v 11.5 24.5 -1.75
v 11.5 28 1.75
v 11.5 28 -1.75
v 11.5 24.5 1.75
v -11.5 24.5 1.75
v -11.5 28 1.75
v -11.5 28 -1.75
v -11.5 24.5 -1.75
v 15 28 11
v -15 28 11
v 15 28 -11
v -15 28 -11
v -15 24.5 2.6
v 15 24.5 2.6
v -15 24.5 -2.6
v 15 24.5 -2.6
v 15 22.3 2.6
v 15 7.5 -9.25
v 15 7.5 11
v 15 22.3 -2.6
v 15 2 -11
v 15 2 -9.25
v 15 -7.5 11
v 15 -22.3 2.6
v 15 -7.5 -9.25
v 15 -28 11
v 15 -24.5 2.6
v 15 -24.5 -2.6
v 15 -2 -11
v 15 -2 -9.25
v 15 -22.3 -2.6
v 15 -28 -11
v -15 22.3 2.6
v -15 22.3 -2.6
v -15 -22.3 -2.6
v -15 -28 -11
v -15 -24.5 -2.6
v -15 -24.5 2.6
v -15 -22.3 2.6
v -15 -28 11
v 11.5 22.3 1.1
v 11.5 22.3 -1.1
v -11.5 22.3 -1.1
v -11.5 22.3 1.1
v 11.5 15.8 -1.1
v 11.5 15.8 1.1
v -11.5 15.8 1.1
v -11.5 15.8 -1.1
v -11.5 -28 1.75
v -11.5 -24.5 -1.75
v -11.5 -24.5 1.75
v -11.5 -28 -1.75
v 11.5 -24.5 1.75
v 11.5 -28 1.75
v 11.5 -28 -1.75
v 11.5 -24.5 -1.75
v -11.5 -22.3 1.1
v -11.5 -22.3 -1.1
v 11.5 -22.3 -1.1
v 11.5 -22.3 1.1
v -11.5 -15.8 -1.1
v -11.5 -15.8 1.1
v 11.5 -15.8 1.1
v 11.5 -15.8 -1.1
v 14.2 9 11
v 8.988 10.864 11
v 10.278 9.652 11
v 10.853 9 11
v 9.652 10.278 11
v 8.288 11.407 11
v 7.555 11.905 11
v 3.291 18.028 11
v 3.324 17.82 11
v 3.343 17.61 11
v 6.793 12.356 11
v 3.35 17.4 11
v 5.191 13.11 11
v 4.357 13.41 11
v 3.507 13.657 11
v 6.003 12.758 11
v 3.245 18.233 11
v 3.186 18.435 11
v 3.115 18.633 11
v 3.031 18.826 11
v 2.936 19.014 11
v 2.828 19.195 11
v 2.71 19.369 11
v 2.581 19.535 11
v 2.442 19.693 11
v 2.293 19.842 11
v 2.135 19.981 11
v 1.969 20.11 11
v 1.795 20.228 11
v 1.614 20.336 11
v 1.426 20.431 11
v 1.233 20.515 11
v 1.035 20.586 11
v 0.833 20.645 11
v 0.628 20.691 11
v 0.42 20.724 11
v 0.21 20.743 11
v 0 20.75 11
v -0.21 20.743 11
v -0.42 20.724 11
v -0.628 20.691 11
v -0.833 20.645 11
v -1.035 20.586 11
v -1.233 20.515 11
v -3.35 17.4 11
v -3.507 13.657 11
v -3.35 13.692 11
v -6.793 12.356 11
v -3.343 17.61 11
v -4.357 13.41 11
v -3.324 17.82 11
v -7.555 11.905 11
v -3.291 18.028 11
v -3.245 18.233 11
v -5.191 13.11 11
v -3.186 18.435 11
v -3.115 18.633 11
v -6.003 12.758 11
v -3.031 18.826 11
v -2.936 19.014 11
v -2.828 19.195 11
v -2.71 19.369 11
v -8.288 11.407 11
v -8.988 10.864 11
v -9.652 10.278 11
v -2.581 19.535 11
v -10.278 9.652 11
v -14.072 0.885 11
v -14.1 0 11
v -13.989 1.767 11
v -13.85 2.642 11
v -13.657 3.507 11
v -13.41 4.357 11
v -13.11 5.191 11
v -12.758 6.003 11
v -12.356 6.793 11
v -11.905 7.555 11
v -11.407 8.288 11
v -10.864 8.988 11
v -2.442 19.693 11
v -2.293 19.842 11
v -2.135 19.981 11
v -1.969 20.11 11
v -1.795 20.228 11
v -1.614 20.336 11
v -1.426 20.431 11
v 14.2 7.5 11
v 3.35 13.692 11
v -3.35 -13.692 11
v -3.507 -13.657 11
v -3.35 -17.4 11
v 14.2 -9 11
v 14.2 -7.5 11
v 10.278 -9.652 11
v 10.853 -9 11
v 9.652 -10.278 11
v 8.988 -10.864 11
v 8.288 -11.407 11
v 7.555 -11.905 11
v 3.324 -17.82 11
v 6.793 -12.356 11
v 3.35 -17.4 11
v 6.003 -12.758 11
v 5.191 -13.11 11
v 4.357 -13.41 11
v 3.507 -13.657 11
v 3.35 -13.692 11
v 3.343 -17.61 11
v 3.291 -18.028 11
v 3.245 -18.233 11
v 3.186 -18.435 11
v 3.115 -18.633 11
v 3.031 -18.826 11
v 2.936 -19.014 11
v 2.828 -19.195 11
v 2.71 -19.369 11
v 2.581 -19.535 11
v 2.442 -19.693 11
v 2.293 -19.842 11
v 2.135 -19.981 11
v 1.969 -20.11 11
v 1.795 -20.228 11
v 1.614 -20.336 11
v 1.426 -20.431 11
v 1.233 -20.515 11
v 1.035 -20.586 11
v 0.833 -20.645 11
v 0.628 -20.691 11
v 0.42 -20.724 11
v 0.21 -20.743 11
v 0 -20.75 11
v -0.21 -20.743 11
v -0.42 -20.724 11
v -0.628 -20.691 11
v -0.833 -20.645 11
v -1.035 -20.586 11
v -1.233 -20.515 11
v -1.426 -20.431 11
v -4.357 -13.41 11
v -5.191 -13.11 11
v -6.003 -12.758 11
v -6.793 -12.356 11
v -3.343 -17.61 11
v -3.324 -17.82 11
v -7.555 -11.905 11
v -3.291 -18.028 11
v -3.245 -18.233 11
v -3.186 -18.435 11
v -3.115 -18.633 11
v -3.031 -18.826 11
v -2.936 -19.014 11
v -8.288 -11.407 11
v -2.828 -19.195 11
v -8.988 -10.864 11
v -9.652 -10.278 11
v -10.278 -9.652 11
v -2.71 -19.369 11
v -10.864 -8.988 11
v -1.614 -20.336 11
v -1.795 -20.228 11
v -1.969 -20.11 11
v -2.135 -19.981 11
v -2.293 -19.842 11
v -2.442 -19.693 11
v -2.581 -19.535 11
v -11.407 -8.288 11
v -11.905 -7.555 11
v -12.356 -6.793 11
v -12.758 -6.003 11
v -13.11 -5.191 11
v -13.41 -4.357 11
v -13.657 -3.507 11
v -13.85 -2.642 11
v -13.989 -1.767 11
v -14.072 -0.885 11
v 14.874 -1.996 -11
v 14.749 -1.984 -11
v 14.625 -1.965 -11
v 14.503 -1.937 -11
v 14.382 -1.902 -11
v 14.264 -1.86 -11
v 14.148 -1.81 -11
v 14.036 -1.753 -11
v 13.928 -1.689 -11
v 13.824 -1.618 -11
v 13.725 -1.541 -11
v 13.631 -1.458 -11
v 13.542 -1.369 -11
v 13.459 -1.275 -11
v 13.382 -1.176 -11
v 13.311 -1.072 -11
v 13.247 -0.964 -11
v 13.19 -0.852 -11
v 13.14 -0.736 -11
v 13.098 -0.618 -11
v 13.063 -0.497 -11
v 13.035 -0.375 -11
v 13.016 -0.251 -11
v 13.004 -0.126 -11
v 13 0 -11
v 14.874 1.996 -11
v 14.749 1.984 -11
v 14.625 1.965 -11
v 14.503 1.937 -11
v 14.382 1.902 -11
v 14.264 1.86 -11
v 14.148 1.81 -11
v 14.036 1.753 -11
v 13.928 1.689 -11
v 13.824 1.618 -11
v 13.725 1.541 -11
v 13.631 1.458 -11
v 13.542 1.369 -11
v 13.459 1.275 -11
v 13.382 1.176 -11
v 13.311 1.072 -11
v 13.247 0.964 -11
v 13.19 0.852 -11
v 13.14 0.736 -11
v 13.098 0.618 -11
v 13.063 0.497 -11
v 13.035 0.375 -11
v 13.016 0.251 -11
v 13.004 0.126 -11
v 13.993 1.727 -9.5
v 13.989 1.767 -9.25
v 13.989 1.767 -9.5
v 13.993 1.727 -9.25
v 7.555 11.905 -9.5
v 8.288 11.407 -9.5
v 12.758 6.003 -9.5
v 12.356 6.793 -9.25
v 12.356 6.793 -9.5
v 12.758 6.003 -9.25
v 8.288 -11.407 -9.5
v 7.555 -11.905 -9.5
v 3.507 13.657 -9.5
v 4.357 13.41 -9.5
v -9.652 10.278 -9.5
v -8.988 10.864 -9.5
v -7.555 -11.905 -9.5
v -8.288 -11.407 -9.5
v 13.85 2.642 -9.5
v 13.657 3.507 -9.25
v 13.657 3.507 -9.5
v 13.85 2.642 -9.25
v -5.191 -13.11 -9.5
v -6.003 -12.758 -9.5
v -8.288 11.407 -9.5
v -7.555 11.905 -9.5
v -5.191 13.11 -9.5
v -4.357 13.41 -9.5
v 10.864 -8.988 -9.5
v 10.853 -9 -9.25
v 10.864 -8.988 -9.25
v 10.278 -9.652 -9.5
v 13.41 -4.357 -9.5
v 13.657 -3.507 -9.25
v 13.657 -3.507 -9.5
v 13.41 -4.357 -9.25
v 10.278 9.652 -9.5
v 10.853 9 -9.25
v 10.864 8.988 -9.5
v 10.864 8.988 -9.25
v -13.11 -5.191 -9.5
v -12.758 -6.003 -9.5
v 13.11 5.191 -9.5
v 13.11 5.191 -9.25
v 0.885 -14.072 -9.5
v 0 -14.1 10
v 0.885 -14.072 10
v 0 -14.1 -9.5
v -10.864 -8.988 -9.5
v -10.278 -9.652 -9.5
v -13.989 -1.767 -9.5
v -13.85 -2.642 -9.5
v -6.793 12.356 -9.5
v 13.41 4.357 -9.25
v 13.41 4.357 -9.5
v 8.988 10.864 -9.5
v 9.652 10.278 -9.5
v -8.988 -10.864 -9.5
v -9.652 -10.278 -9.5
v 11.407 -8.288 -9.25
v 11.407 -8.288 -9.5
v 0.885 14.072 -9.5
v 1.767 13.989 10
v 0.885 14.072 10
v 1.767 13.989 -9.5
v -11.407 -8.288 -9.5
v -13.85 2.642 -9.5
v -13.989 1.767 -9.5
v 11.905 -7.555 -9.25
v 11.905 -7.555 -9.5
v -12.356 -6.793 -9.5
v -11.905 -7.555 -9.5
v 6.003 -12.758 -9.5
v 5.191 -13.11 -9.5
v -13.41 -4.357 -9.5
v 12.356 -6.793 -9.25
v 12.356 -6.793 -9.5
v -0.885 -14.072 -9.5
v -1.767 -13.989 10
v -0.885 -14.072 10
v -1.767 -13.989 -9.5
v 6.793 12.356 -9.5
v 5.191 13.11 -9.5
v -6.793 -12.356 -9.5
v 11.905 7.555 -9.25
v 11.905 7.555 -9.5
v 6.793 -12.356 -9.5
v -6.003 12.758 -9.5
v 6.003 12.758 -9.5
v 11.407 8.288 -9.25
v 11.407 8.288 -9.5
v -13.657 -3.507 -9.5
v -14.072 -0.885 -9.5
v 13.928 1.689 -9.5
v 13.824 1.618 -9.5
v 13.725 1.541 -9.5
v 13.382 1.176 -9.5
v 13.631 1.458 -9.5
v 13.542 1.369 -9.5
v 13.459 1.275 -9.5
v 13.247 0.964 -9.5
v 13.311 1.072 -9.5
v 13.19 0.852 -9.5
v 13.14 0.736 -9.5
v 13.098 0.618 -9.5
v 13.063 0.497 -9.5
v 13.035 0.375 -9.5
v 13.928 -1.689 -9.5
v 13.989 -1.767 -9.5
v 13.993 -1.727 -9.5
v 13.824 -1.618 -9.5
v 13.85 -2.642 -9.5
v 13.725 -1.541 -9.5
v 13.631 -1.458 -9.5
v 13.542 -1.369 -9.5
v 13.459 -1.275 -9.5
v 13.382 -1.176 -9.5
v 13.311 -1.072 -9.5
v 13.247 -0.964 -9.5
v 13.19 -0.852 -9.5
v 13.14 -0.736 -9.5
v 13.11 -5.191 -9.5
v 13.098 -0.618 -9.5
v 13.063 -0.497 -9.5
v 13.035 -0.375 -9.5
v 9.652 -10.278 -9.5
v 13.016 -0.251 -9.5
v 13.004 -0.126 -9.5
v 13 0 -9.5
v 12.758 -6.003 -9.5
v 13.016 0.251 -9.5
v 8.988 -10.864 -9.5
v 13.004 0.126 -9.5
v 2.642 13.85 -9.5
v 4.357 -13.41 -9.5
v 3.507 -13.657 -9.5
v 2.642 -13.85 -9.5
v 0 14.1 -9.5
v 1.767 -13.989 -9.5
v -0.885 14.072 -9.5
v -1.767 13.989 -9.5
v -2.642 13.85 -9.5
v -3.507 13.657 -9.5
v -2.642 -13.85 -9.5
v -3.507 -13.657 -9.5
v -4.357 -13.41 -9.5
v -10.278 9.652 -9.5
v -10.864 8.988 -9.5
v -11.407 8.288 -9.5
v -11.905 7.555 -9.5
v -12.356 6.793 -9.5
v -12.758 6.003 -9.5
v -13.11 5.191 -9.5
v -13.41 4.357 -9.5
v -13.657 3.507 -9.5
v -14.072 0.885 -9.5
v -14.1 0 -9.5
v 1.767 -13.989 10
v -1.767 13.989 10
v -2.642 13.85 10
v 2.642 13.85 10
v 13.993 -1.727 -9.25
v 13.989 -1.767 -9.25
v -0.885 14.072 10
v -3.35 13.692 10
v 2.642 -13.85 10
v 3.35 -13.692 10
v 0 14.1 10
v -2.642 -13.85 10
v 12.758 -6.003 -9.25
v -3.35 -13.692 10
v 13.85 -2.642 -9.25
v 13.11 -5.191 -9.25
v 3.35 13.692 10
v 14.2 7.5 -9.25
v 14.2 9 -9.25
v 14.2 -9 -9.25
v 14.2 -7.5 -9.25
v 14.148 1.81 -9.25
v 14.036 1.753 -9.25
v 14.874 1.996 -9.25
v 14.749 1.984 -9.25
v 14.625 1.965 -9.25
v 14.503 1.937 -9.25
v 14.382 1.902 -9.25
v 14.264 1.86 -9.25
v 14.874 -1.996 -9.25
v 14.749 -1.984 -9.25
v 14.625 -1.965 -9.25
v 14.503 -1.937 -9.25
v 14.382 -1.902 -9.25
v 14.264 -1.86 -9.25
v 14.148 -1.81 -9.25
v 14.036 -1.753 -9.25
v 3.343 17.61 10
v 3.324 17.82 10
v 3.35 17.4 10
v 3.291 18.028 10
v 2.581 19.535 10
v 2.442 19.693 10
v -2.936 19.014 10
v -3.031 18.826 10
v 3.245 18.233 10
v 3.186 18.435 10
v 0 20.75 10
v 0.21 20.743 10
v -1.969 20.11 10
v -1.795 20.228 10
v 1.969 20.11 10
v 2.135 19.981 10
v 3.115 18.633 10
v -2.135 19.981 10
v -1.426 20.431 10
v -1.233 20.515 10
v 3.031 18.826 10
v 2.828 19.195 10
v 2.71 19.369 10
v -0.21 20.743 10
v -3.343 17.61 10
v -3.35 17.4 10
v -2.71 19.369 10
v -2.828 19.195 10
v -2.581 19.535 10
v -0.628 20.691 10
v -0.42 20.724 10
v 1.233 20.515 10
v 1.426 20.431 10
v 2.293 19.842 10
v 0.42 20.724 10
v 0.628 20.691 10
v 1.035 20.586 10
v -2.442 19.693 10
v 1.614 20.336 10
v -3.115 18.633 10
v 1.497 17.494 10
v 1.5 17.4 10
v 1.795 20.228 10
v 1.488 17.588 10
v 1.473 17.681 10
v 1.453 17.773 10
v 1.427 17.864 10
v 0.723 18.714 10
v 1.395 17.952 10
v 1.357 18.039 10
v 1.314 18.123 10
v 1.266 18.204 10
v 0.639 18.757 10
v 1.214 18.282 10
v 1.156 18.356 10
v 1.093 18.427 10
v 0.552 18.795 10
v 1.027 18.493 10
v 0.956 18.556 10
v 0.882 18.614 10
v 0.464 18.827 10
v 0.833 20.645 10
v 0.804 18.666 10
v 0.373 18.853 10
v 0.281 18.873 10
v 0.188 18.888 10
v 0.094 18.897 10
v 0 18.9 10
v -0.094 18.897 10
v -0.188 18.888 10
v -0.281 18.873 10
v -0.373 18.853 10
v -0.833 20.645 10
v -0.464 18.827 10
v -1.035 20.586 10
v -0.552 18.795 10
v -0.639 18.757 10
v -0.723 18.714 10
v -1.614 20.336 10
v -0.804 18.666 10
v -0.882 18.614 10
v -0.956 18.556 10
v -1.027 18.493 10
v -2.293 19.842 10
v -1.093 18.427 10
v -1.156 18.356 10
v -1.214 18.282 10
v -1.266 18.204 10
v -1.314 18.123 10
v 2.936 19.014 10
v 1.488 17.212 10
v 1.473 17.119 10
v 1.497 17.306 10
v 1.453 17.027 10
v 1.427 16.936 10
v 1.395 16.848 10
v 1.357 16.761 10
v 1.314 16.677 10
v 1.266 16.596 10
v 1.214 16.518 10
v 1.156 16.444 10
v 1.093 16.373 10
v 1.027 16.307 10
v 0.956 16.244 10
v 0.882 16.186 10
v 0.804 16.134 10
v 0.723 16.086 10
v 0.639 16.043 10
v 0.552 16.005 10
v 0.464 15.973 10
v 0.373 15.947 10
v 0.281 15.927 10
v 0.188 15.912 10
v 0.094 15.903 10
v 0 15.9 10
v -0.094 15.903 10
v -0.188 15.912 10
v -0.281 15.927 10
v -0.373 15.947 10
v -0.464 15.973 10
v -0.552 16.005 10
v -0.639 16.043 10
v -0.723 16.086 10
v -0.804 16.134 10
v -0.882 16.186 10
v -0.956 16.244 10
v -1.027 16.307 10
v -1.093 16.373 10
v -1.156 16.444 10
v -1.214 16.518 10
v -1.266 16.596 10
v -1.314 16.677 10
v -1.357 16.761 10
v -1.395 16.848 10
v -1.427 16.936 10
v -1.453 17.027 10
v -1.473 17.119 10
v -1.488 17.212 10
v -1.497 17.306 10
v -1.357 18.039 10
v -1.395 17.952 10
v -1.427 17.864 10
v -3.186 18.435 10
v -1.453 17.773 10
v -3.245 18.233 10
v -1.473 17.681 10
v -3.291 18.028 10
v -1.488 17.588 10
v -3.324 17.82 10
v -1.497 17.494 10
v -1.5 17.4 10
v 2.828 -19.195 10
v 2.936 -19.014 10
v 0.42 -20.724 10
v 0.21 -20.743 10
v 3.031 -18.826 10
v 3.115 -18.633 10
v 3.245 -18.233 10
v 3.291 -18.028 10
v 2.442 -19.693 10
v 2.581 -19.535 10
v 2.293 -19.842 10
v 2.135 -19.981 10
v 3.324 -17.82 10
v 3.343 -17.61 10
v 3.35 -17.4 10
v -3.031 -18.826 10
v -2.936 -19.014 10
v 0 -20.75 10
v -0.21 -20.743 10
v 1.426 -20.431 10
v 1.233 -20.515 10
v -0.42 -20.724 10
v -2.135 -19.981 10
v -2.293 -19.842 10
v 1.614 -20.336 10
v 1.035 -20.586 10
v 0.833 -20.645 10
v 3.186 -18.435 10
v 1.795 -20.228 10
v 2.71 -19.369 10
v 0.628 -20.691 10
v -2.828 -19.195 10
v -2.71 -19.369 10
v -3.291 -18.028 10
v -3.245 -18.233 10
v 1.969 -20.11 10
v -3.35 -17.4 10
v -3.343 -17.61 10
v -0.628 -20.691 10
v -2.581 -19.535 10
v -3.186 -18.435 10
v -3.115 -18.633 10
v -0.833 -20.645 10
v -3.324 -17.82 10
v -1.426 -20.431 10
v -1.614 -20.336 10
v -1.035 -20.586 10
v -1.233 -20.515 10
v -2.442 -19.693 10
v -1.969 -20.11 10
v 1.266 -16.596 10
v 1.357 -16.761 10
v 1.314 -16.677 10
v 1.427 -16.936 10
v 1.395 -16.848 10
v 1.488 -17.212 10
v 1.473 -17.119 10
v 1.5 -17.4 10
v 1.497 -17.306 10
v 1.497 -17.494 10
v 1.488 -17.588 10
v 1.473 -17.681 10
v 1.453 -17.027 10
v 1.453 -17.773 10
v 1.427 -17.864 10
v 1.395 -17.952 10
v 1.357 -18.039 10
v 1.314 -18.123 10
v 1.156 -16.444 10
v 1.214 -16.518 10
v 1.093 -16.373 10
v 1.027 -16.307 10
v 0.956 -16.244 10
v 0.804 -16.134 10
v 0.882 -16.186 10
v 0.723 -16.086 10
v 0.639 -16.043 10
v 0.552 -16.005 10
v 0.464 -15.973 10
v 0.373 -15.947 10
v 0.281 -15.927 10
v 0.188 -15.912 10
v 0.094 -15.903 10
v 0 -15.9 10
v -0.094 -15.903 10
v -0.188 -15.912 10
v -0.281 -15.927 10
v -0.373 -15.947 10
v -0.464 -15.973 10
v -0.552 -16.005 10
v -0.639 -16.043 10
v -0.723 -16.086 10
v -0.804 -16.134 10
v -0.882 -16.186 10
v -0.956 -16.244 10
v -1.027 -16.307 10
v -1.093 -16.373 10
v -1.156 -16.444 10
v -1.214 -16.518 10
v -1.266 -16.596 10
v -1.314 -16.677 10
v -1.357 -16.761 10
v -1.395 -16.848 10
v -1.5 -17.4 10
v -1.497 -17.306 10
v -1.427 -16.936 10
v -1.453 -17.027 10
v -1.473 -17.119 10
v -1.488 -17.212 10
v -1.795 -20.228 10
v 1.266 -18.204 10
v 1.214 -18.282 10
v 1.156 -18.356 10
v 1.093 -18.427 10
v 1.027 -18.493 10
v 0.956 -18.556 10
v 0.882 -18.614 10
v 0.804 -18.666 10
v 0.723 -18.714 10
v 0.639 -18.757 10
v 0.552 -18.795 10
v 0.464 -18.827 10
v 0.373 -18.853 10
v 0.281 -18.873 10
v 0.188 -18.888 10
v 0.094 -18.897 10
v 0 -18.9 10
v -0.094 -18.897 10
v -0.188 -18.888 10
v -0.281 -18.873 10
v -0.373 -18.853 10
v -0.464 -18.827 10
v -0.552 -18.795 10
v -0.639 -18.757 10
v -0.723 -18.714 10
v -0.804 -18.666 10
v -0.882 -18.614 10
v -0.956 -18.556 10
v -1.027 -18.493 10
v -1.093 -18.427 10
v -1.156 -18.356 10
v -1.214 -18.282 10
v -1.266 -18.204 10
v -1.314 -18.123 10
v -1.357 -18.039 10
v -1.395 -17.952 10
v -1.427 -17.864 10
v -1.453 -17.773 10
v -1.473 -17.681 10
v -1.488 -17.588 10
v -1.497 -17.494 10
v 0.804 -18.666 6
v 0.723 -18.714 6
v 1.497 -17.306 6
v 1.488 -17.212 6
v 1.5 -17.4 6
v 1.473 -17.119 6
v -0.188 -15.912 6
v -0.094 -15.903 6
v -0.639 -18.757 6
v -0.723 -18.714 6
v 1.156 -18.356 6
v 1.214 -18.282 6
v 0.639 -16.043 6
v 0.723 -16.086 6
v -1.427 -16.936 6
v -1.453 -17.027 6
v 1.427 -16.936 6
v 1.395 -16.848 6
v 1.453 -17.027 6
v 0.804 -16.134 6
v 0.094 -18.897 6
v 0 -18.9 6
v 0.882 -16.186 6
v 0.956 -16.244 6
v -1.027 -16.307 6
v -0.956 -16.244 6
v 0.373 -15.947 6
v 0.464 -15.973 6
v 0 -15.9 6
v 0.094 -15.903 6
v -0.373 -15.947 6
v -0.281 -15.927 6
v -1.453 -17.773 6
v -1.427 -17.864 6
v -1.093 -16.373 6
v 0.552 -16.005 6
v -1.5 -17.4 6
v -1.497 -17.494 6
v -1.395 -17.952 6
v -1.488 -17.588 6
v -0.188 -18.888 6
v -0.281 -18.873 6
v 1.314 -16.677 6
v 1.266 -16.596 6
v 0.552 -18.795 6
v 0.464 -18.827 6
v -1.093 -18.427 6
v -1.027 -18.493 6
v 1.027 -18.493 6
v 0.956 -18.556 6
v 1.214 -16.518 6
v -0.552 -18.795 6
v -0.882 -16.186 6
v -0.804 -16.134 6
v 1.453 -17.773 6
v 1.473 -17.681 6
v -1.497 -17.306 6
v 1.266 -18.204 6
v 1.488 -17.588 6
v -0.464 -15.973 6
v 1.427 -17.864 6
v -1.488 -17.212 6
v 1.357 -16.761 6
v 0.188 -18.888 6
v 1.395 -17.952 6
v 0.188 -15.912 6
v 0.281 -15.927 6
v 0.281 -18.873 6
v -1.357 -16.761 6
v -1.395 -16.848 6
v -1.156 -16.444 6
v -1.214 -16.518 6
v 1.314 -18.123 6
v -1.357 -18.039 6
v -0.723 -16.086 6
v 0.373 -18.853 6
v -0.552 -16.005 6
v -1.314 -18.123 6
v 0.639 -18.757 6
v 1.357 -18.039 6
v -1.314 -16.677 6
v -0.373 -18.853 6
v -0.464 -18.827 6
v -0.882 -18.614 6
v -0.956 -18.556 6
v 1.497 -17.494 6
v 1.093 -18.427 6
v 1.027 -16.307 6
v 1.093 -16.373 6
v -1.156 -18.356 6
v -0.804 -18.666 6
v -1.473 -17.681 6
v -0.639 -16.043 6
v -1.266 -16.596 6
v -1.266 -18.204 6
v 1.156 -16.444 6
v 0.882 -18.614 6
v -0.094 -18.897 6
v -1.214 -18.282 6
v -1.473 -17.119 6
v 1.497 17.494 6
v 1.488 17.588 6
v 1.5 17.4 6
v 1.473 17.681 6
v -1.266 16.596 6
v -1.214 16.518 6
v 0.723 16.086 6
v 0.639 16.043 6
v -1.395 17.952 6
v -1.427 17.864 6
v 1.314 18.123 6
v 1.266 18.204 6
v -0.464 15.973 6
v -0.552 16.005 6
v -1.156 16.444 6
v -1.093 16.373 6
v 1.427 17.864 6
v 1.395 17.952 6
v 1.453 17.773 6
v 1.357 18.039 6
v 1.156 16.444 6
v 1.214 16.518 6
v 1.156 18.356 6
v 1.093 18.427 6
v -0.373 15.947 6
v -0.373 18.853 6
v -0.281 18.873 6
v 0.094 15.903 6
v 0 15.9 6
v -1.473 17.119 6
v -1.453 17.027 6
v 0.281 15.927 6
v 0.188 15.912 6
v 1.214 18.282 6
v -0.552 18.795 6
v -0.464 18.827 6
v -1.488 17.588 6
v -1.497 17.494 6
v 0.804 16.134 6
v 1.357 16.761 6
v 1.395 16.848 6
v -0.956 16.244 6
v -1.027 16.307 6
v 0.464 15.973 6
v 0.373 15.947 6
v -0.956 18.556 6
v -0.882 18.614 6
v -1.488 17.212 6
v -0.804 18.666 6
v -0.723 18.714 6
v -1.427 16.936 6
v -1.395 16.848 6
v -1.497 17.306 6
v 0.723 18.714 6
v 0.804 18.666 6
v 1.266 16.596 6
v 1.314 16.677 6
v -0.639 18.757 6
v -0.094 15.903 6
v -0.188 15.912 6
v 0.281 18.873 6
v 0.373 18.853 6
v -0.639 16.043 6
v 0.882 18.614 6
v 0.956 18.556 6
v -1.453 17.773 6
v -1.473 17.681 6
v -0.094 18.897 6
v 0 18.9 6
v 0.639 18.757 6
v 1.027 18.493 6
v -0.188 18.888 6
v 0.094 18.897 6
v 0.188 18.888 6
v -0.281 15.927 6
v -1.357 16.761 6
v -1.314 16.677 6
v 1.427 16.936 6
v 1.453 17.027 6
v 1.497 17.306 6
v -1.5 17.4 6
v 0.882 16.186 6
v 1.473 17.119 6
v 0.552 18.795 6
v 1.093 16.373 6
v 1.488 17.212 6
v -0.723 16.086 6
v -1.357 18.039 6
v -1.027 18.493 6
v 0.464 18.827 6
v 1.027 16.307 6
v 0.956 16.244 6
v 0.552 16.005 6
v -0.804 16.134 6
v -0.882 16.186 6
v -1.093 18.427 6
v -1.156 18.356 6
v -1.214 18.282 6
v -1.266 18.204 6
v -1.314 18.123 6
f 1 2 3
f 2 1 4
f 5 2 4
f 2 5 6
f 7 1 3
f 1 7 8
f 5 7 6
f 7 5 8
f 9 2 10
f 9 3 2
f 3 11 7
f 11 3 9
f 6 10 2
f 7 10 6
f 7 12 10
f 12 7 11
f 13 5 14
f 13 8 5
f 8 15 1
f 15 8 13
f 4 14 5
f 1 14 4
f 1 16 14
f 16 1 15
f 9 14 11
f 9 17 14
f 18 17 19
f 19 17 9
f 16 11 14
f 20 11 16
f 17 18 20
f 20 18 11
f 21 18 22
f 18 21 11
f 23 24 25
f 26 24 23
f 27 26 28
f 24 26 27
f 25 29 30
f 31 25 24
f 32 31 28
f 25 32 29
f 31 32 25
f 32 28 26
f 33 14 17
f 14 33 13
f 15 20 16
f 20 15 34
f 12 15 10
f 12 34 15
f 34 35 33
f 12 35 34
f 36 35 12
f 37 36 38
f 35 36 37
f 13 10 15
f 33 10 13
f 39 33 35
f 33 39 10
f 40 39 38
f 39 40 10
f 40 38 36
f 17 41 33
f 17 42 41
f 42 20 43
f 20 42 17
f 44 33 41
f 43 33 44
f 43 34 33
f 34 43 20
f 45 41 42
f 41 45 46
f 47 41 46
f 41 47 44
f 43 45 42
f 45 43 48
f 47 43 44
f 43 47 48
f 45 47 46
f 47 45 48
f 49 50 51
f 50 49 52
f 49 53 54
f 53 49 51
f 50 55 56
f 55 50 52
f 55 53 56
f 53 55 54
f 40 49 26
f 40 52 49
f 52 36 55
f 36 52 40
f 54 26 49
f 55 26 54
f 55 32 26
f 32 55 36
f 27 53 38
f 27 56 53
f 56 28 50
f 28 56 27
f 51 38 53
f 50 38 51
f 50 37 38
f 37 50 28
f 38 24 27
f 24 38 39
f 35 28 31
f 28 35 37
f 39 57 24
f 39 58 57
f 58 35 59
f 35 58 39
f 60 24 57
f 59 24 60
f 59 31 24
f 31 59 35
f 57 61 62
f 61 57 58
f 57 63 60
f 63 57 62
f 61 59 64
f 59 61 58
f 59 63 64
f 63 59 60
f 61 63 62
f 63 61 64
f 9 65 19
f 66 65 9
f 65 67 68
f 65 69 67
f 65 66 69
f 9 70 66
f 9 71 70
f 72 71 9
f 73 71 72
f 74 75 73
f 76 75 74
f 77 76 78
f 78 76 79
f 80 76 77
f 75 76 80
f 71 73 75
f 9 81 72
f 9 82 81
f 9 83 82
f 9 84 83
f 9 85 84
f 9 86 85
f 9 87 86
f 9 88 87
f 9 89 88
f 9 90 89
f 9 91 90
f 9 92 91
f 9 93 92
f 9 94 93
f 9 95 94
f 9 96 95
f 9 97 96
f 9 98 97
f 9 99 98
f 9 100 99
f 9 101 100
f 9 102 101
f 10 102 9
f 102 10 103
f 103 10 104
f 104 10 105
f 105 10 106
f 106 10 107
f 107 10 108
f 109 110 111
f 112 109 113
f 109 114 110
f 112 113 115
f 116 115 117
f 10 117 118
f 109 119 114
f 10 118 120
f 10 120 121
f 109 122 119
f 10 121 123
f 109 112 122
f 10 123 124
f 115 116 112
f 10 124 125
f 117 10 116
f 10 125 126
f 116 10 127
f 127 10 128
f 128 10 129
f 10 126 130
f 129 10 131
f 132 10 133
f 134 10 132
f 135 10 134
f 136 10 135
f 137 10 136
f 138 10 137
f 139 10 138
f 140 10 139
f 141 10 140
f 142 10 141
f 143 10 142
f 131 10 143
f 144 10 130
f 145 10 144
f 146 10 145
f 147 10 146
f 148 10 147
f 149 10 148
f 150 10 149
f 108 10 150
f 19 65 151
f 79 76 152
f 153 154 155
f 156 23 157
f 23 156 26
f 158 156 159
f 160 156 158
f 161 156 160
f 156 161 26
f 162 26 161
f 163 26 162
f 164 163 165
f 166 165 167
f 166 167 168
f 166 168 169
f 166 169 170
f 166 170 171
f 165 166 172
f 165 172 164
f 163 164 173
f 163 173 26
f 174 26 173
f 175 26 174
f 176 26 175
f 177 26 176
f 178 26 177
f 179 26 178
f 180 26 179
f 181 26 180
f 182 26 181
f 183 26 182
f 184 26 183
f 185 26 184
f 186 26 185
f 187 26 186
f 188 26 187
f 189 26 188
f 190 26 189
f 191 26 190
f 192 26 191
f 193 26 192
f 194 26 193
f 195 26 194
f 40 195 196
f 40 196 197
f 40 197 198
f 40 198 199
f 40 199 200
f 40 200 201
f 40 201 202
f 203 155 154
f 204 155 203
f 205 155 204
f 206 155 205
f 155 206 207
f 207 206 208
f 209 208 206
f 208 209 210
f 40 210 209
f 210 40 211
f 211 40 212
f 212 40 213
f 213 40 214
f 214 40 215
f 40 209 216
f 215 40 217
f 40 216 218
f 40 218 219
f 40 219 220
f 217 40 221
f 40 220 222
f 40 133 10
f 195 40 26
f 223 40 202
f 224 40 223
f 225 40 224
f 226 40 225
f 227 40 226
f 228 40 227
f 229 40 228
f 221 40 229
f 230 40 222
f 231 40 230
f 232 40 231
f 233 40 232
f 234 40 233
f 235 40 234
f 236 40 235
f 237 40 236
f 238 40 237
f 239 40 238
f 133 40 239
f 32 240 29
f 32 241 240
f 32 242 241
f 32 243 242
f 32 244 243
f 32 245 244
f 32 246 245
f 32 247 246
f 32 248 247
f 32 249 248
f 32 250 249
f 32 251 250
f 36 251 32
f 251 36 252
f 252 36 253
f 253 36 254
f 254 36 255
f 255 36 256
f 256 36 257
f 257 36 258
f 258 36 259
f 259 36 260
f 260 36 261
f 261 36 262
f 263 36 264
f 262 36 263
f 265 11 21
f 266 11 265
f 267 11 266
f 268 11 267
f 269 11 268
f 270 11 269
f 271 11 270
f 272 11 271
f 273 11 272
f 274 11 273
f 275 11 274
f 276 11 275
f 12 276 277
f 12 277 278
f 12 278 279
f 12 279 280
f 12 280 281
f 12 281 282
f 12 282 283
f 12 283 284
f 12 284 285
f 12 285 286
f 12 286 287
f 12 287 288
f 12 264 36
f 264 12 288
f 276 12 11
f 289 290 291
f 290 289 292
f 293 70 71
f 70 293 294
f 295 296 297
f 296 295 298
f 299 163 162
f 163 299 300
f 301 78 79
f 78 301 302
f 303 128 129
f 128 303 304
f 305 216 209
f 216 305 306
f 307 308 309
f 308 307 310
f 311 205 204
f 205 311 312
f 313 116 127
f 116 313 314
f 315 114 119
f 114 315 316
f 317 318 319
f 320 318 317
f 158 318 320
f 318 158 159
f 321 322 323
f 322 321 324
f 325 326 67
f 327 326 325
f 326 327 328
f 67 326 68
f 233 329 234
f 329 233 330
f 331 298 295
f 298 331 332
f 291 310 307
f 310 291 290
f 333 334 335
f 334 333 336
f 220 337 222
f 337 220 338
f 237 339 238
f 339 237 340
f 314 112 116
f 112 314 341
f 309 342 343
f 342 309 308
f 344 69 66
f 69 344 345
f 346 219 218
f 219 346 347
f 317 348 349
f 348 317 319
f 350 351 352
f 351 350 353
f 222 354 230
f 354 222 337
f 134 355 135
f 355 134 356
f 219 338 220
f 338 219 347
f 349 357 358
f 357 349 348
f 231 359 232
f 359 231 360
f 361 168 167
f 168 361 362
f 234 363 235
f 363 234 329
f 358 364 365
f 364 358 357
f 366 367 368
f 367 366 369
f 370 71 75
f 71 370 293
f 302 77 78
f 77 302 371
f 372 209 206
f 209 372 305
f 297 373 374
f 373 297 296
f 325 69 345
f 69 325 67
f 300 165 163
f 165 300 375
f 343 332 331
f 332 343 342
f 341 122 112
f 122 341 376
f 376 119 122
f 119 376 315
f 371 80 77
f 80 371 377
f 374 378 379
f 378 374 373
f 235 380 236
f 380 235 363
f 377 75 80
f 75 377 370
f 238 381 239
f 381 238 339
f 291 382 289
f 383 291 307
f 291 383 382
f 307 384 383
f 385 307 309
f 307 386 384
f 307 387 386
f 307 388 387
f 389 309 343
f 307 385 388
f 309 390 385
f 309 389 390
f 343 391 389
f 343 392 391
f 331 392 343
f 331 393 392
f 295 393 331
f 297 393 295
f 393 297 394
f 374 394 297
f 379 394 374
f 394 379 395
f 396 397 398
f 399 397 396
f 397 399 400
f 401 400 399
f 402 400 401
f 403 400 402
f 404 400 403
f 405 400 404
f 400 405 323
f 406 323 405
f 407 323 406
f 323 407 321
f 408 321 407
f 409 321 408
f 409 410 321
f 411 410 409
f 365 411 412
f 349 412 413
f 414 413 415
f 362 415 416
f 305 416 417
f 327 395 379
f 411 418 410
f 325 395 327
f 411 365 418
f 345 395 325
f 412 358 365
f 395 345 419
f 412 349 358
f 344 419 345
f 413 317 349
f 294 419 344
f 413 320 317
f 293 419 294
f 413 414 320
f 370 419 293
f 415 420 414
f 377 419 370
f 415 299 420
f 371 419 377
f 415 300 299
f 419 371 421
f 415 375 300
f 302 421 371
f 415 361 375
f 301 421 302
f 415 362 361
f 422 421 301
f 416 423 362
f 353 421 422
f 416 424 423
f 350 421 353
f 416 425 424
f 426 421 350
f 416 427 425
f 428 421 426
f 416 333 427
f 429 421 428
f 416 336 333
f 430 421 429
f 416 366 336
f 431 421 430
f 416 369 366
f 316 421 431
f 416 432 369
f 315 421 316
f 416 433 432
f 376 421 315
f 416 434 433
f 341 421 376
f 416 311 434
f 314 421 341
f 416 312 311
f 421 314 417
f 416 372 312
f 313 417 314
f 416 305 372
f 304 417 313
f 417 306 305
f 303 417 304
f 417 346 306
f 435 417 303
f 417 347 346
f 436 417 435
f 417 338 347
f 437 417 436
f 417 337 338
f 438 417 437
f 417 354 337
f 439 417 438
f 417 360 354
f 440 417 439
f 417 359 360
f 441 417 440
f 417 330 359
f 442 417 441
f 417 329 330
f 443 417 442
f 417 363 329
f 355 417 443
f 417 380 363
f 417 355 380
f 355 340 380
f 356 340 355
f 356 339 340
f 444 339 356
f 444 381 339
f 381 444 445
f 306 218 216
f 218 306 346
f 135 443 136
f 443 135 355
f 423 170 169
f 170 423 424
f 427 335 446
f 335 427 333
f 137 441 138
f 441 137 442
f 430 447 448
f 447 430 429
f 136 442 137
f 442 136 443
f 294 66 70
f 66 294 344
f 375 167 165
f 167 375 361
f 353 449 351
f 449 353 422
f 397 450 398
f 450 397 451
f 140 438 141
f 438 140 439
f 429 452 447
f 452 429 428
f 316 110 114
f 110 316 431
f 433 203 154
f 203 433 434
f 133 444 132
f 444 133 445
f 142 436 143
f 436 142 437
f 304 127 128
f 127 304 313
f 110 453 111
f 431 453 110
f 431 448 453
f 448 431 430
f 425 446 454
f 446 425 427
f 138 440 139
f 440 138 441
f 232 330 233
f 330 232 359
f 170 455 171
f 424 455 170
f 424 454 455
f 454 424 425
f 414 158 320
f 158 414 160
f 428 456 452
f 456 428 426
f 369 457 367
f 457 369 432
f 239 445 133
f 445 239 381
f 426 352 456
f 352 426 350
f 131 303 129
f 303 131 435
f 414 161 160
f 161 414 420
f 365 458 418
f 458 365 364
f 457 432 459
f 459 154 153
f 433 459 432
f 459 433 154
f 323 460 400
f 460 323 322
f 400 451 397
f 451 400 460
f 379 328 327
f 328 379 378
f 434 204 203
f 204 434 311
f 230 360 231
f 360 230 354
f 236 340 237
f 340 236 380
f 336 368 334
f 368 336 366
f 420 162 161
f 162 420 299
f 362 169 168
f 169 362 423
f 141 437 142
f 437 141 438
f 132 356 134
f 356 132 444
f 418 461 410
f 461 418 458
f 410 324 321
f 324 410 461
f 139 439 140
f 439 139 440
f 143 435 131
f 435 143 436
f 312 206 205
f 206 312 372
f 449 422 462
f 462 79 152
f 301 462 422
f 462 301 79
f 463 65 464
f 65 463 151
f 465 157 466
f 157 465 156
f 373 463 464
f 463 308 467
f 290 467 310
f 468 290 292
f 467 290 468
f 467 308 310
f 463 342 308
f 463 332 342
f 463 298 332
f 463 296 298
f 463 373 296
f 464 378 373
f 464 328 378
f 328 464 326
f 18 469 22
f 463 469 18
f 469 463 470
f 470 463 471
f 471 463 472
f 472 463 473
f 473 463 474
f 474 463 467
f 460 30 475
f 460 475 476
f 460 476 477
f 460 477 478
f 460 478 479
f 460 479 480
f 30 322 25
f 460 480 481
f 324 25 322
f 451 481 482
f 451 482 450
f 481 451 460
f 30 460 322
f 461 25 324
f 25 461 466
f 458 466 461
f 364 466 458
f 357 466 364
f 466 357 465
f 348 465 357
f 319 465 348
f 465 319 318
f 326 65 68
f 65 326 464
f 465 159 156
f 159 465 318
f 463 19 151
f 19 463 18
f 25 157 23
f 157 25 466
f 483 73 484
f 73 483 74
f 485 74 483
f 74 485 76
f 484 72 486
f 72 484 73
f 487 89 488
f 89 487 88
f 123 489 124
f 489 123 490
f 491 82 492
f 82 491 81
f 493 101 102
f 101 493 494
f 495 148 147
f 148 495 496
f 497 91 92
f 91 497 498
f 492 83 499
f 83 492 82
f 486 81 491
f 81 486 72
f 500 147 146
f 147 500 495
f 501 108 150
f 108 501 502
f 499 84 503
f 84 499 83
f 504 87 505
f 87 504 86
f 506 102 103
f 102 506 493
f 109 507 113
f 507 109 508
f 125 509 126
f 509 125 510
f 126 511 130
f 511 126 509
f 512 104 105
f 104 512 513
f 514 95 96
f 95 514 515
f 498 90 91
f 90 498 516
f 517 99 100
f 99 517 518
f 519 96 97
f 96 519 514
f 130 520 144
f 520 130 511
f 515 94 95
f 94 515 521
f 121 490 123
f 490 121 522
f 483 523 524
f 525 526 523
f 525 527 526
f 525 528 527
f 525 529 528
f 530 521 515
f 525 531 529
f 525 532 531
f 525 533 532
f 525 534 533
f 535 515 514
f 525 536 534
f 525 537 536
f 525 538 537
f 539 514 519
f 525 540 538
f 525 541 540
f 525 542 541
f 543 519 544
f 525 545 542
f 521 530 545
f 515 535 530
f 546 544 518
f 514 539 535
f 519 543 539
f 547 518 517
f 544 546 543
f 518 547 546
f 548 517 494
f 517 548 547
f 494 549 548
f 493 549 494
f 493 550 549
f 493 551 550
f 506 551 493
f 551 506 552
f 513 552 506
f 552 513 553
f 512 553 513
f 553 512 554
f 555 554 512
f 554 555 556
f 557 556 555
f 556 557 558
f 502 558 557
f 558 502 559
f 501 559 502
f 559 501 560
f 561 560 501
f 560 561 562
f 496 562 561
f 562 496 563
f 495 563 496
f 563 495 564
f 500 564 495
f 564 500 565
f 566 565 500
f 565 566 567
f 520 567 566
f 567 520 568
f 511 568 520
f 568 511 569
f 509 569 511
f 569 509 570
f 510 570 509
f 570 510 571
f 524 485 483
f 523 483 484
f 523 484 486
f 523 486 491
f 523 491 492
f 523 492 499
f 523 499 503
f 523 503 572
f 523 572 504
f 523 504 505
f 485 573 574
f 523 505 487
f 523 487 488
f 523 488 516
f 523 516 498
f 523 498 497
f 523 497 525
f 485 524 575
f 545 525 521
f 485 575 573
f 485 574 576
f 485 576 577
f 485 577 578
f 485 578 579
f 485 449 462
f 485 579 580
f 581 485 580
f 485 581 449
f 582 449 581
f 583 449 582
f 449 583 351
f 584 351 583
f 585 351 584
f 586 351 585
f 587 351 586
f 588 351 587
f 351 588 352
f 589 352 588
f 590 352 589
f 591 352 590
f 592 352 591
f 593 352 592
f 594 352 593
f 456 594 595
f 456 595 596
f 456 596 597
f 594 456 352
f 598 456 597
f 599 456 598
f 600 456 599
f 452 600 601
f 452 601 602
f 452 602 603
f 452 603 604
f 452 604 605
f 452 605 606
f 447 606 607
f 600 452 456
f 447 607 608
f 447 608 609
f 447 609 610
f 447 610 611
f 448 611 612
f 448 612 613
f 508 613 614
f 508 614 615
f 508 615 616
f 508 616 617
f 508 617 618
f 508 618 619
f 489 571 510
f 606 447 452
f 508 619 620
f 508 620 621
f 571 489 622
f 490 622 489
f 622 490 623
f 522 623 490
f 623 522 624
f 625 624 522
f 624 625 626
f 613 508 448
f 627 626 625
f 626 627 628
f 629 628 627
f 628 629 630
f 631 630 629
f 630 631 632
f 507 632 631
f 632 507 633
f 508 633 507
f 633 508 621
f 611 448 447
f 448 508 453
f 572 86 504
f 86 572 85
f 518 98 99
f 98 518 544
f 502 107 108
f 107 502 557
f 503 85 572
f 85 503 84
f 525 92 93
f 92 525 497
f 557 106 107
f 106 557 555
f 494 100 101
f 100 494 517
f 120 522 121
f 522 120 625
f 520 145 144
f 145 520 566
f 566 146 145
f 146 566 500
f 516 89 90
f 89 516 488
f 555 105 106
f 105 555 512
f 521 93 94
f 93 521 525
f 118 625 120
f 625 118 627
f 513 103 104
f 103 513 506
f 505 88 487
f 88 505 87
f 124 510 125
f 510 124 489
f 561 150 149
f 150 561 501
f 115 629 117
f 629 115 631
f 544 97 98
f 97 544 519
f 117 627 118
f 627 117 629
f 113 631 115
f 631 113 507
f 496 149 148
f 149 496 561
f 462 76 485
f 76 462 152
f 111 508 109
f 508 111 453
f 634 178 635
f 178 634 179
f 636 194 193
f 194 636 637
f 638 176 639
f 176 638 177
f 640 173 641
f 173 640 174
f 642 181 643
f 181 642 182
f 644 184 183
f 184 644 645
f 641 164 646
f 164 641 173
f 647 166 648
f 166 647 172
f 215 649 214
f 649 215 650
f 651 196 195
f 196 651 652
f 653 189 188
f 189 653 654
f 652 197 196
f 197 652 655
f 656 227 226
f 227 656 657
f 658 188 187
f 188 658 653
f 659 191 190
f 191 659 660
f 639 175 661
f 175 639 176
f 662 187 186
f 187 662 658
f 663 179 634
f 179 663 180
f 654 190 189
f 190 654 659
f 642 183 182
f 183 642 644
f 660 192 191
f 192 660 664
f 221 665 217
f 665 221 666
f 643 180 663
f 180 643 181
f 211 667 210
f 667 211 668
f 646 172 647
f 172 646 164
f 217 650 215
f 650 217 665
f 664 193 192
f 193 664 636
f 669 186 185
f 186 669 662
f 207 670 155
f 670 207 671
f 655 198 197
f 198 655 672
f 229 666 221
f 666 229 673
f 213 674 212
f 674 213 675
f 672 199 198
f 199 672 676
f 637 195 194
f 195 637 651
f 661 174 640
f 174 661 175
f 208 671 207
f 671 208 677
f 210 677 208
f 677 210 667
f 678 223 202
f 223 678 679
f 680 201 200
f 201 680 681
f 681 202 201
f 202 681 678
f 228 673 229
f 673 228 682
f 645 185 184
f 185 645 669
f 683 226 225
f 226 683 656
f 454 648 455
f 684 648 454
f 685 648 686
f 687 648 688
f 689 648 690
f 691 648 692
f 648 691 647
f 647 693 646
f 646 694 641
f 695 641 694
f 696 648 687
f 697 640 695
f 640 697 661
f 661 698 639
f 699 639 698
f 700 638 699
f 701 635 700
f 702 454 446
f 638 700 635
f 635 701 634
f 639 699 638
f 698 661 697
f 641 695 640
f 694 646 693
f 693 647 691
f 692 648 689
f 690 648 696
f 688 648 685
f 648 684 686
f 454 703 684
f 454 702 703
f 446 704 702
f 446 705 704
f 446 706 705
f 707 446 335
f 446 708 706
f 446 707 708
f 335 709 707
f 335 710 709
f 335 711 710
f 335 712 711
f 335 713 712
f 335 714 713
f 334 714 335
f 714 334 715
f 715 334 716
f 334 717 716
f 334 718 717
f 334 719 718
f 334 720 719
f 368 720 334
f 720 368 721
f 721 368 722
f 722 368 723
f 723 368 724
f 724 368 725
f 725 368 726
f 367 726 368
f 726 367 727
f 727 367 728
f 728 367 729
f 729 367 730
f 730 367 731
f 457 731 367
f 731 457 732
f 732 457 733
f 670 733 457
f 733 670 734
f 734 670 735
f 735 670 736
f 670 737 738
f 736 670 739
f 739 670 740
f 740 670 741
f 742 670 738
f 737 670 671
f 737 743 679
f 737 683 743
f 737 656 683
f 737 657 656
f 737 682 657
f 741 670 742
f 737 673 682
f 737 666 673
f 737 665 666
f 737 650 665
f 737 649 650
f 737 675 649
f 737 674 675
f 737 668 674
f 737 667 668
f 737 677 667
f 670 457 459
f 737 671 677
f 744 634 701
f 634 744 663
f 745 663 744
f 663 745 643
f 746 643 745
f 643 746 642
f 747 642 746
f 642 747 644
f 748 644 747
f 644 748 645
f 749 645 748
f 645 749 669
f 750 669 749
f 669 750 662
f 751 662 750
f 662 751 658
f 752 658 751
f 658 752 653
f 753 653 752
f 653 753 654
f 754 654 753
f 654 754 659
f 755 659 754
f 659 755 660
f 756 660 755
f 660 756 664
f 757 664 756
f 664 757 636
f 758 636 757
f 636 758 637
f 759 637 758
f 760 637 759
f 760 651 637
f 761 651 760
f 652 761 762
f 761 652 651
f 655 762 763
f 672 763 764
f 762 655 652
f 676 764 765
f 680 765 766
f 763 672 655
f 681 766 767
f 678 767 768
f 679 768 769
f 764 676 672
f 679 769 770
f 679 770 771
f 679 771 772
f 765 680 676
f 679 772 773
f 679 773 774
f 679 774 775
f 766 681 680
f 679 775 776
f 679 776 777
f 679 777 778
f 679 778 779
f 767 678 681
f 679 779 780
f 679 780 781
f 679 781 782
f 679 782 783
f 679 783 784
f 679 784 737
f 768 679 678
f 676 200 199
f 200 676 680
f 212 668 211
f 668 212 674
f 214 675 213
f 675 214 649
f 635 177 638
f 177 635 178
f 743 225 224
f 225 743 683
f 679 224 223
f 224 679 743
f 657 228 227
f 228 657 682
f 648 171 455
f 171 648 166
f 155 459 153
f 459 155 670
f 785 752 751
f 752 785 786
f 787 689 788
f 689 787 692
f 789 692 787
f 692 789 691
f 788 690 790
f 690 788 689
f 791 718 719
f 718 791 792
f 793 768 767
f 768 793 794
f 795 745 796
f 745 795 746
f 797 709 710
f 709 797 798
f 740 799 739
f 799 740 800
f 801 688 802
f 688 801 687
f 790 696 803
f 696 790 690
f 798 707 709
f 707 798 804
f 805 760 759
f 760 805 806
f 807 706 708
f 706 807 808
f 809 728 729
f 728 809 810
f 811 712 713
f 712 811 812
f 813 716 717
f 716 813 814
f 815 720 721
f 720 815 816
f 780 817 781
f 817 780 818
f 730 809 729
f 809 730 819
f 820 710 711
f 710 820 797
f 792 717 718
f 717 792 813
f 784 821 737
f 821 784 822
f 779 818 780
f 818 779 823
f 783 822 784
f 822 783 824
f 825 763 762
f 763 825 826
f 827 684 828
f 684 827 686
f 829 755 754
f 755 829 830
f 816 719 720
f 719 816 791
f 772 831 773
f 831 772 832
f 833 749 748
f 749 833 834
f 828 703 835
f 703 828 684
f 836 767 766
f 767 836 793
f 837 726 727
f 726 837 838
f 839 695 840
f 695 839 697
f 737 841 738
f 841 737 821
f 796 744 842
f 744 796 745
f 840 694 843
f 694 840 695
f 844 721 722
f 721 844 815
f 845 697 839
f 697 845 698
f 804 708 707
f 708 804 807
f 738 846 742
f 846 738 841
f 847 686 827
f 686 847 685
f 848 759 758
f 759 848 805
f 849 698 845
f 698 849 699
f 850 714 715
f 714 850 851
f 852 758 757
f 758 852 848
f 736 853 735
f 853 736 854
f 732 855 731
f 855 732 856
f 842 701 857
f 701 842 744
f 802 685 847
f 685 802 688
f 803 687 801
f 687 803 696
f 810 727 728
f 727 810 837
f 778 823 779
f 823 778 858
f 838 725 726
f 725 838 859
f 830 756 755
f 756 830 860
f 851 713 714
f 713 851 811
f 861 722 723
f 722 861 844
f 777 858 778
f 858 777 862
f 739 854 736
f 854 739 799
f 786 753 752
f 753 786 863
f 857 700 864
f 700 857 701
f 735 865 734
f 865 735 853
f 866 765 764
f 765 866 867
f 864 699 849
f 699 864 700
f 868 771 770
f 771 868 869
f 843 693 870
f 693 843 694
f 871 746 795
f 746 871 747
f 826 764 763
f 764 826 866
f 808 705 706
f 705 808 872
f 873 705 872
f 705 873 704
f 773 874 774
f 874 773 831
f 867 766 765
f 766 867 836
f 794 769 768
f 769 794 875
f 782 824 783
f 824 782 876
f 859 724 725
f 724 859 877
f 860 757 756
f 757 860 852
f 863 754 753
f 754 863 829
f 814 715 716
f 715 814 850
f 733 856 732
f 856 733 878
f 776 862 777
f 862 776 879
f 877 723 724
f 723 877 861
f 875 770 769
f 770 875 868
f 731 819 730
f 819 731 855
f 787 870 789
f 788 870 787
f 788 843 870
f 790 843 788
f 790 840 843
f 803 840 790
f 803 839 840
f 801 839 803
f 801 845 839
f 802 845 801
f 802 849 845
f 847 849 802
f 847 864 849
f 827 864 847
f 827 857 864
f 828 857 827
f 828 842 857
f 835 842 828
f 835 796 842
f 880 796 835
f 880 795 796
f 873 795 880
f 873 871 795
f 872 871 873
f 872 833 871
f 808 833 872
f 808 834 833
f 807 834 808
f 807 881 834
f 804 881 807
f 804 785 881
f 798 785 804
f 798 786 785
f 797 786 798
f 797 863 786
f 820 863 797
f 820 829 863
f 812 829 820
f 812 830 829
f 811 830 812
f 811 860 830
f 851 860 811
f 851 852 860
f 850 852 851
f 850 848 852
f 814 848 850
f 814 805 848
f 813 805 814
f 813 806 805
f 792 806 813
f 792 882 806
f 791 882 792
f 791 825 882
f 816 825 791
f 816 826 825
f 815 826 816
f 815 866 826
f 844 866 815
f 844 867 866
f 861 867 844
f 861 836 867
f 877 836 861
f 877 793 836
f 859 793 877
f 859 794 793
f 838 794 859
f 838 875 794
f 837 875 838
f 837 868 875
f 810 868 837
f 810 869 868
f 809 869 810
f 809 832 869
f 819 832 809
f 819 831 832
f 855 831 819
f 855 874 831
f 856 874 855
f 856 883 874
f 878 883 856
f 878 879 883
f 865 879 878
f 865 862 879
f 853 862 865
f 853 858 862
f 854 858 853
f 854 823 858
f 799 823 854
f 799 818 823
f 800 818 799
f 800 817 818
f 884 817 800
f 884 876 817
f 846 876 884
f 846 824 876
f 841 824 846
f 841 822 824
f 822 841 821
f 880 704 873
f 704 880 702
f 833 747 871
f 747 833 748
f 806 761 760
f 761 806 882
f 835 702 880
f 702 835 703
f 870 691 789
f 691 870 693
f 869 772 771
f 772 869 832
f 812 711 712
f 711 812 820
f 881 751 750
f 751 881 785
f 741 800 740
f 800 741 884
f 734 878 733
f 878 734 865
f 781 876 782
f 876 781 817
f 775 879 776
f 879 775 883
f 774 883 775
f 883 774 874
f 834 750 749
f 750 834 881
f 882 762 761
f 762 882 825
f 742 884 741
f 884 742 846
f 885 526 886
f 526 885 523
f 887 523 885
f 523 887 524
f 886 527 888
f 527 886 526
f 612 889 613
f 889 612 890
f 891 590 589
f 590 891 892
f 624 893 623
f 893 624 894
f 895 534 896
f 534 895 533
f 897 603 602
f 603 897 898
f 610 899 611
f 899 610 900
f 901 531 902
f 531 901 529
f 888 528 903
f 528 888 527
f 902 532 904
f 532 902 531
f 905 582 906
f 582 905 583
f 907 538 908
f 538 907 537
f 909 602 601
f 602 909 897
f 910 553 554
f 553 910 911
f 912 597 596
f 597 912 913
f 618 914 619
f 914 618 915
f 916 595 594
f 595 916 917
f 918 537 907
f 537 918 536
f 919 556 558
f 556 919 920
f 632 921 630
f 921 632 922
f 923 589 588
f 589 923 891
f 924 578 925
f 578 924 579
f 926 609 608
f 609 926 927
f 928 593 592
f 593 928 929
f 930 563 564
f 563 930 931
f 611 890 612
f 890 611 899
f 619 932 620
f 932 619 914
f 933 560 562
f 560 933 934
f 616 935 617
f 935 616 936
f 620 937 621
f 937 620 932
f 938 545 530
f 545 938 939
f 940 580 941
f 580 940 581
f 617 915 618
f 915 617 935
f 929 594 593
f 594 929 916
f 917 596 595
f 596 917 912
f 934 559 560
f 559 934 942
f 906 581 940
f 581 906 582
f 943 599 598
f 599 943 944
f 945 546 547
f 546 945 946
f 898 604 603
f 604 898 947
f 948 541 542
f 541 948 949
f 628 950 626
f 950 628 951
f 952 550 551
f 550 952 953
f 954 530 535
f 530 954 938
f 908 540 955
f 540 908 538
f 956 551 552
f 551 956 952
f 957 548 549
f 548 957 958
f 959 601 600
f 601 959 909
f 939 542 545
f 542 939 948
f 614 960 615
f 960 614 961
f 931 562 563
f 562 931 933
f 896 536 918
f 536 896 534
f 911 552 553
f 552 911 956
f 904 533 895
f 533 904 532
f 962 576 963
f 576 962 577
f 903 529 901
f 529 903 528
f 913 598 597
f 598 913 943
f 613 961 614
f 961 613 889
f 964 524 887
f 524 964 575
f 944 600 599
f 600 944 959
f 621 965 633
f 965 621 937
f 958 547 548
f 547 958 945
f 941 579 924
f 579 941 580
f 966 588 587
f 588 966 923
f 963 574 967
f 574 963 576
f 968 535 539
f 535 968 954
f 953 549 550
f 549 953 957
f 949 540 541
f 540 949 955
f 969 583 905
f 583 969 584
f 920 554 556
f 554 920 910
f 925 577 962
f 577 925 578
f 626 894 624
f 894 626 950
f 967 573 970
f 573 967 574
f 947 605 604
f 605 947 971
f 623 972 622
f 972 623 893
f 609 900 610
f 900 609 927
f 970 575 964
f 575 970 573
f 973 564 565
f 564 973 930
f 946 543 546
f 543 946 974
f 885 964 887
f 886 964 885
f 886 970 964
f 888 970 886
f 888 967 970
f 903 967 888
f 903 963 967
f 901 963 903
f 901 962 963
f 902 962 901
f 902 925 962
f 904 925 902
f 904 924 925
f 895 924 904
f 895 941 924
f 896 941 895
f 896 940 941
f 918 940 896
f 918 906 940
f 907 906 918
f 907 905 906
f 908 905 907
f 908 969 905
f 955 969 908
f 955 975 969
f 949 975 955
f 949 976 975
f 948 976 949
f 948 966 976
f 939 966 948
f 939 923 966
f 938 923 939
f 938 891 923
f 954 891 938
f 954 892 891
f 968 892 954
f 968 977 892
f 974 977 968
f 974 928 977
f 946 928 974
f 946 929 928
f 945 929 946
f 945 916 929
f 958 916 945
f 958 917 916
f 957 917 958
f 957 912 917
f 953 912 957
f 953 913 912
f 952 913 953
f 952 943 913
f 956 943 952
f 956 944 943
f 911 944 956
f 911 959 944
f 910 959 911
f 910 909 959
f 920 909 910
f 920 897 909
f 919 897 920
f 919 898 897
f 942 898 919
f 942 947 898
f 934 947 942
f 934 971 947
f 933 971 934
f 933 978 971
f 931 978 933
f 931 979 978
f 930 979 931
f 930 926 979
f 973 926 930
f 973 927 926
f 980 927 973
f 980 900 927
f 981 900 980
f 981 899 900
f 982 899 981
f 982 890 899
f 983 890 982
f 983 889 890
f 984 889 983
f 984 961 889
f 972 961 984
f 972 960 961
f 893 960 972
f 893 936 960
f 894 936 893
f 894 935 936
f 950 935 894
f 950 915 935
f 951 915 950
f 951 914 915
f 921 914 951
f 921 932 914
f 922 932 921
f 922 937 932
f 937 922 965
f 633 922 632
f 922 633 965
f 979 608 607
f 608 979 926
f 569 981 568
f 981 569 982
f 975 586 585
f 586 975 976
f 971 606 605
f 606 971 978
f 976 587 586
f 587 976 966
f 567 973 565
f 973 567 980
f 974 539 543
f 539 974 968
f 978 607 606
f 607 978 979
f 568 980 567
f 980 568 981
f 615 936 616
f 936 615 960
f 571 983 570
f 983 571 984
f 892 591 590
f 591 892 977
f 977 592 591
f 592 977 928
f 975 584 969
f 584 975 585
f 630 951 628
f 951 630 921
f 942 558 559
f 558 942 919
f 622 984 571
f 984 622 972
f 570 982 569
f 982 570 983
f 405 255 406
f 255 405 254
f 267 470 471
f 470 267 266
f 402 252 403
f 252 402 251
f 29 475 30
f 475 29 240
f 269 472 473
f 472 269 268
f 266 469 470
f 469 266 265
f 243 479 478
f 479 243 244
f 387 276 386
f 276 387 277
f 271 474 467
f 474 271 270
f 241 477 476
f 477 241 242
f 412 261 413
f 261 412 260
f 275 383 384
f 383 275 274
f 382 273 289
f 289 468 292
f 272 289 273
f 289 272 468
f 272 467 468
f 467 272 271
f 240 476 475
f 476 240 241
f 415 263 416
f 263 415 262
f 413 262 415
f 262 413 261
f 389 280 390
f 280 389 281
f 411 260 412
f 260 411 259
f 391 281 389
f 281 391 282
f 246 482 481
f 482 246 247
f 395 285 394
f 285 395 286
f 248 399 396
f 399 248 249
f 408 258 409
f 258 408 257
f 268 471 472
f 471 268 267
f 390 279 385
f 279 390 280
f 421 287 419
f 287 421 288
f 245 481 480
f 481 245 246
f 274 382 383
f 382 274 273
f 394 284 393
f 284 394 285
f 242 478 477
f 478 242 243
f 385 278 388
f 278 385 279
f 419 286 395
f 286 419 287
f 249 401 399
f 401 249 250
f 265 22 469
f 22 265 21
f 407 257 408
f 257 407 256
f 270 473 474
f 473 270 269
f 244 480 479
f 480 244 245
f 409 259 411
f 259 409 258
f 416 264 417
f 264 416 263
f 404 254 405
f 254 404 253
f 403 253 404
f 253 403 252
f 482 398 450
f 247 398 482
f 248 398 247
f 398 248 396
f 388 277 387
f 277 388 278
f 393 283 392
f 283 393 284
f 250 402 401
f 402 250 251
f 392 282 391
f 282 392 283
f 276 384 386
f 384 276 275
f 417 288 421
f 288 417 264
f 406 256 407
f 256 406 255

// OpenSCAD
// Model purpose: Motor housing block for the motorized blinds mechanism, with internal cutouts and screw passages sized around the selected motor and fasteners.
// Derived from Motorized MQTT Blinds work and adapted to your dimensions so the motor mounts securely in the blind drive assembly.
// this is based on thehookup's Motorized MQTT Blinds project:
// https://github.com/thehookup/Motorized_MQTT_Blinds/blob/master/BlindsBase.scad

block_z = 22;
block_y = 56;
block_x = 30;
cylinder_cutout_depth = 25;

$fn = 100;

module screw_gap() {
  wall_thickness = 3.5;
  wall_hole_diameter = 3.5;
  wall_hole_margin = 3.5;

  nut_thickness = 2.2;
  nut_hole_diameter = 5.2;

  screw_hole_thickness = 6.5;
  screw_hole_diameter = 2.2;

  // sum all thickness = 12.2

  translate([0, -wall_thickness/2, 0]) union() {
    cube([
      block_x - wall_hole_margin * 2,
      wall_thickness,
      wall_hole_diameter,
    ], center=true);

    translate([0, -wall_thickness/2 - nut_thickness/2, 0])
      cube([block_x, nut_thickness, nut_hole_diameter], center=true);

    translate([0, -wall_thickness/2 - nut_thickness - screw_hole_thickness/2, 0])
      cube([
        block_x - wall_hole_margin * 2,
        screw_hole_thickness,
        screw_hole_diameter,
      ], center=true);
  }
}

module motor_case() {
  difference() {
    cube([block_x, block_y, block_z], center=true);
    
    color("blue")
      translate([0,0,3])
      cylinder(r=14.1, h=cylinder_cutout_depth, $fn=100, center=true);
    color("red") translate([5.7,0,6]) cube([17,18,30.5], center=true);
    color("black") translate([10,0,6]) cube([17,15,30.5], center=true);

    color("purple") translate([0,17.4,10]) cylinder(r=3.35, h=2, $fn=100);
    color("orange") translate([0,14.05,11]) cube([6.7,6.7,2], center=true);

    color("purple") translate([0,-17.4,10]) cylinder(r=3.35, h=2, $fn=100);
    color("orange") translate([0,-14.05,11]) cube([6.7,6.7,2], center=true);

    color("green") translate([0,-17.4,6]) cylinder(r=1.5, h=5, $fn=100);
    color("green") translate([0,17.4,6]) cylinder(r=1.5, h=5, $fn=100);

    color("cyan")
      translate([(block_x / 2),0,-(block_z/2)])
      cylinder(r=2, h=4, $fn=100, center=true);

    /* holes for screws */
    translate([0, block_y / 2, 0])
      screw_gap();

    /* holes for screws */
    translate([0, -block_y / 2, 0])
      rotate([0, 0, 180])
      screw_gap();
  }

}

motor_case();
//screw_gap();
